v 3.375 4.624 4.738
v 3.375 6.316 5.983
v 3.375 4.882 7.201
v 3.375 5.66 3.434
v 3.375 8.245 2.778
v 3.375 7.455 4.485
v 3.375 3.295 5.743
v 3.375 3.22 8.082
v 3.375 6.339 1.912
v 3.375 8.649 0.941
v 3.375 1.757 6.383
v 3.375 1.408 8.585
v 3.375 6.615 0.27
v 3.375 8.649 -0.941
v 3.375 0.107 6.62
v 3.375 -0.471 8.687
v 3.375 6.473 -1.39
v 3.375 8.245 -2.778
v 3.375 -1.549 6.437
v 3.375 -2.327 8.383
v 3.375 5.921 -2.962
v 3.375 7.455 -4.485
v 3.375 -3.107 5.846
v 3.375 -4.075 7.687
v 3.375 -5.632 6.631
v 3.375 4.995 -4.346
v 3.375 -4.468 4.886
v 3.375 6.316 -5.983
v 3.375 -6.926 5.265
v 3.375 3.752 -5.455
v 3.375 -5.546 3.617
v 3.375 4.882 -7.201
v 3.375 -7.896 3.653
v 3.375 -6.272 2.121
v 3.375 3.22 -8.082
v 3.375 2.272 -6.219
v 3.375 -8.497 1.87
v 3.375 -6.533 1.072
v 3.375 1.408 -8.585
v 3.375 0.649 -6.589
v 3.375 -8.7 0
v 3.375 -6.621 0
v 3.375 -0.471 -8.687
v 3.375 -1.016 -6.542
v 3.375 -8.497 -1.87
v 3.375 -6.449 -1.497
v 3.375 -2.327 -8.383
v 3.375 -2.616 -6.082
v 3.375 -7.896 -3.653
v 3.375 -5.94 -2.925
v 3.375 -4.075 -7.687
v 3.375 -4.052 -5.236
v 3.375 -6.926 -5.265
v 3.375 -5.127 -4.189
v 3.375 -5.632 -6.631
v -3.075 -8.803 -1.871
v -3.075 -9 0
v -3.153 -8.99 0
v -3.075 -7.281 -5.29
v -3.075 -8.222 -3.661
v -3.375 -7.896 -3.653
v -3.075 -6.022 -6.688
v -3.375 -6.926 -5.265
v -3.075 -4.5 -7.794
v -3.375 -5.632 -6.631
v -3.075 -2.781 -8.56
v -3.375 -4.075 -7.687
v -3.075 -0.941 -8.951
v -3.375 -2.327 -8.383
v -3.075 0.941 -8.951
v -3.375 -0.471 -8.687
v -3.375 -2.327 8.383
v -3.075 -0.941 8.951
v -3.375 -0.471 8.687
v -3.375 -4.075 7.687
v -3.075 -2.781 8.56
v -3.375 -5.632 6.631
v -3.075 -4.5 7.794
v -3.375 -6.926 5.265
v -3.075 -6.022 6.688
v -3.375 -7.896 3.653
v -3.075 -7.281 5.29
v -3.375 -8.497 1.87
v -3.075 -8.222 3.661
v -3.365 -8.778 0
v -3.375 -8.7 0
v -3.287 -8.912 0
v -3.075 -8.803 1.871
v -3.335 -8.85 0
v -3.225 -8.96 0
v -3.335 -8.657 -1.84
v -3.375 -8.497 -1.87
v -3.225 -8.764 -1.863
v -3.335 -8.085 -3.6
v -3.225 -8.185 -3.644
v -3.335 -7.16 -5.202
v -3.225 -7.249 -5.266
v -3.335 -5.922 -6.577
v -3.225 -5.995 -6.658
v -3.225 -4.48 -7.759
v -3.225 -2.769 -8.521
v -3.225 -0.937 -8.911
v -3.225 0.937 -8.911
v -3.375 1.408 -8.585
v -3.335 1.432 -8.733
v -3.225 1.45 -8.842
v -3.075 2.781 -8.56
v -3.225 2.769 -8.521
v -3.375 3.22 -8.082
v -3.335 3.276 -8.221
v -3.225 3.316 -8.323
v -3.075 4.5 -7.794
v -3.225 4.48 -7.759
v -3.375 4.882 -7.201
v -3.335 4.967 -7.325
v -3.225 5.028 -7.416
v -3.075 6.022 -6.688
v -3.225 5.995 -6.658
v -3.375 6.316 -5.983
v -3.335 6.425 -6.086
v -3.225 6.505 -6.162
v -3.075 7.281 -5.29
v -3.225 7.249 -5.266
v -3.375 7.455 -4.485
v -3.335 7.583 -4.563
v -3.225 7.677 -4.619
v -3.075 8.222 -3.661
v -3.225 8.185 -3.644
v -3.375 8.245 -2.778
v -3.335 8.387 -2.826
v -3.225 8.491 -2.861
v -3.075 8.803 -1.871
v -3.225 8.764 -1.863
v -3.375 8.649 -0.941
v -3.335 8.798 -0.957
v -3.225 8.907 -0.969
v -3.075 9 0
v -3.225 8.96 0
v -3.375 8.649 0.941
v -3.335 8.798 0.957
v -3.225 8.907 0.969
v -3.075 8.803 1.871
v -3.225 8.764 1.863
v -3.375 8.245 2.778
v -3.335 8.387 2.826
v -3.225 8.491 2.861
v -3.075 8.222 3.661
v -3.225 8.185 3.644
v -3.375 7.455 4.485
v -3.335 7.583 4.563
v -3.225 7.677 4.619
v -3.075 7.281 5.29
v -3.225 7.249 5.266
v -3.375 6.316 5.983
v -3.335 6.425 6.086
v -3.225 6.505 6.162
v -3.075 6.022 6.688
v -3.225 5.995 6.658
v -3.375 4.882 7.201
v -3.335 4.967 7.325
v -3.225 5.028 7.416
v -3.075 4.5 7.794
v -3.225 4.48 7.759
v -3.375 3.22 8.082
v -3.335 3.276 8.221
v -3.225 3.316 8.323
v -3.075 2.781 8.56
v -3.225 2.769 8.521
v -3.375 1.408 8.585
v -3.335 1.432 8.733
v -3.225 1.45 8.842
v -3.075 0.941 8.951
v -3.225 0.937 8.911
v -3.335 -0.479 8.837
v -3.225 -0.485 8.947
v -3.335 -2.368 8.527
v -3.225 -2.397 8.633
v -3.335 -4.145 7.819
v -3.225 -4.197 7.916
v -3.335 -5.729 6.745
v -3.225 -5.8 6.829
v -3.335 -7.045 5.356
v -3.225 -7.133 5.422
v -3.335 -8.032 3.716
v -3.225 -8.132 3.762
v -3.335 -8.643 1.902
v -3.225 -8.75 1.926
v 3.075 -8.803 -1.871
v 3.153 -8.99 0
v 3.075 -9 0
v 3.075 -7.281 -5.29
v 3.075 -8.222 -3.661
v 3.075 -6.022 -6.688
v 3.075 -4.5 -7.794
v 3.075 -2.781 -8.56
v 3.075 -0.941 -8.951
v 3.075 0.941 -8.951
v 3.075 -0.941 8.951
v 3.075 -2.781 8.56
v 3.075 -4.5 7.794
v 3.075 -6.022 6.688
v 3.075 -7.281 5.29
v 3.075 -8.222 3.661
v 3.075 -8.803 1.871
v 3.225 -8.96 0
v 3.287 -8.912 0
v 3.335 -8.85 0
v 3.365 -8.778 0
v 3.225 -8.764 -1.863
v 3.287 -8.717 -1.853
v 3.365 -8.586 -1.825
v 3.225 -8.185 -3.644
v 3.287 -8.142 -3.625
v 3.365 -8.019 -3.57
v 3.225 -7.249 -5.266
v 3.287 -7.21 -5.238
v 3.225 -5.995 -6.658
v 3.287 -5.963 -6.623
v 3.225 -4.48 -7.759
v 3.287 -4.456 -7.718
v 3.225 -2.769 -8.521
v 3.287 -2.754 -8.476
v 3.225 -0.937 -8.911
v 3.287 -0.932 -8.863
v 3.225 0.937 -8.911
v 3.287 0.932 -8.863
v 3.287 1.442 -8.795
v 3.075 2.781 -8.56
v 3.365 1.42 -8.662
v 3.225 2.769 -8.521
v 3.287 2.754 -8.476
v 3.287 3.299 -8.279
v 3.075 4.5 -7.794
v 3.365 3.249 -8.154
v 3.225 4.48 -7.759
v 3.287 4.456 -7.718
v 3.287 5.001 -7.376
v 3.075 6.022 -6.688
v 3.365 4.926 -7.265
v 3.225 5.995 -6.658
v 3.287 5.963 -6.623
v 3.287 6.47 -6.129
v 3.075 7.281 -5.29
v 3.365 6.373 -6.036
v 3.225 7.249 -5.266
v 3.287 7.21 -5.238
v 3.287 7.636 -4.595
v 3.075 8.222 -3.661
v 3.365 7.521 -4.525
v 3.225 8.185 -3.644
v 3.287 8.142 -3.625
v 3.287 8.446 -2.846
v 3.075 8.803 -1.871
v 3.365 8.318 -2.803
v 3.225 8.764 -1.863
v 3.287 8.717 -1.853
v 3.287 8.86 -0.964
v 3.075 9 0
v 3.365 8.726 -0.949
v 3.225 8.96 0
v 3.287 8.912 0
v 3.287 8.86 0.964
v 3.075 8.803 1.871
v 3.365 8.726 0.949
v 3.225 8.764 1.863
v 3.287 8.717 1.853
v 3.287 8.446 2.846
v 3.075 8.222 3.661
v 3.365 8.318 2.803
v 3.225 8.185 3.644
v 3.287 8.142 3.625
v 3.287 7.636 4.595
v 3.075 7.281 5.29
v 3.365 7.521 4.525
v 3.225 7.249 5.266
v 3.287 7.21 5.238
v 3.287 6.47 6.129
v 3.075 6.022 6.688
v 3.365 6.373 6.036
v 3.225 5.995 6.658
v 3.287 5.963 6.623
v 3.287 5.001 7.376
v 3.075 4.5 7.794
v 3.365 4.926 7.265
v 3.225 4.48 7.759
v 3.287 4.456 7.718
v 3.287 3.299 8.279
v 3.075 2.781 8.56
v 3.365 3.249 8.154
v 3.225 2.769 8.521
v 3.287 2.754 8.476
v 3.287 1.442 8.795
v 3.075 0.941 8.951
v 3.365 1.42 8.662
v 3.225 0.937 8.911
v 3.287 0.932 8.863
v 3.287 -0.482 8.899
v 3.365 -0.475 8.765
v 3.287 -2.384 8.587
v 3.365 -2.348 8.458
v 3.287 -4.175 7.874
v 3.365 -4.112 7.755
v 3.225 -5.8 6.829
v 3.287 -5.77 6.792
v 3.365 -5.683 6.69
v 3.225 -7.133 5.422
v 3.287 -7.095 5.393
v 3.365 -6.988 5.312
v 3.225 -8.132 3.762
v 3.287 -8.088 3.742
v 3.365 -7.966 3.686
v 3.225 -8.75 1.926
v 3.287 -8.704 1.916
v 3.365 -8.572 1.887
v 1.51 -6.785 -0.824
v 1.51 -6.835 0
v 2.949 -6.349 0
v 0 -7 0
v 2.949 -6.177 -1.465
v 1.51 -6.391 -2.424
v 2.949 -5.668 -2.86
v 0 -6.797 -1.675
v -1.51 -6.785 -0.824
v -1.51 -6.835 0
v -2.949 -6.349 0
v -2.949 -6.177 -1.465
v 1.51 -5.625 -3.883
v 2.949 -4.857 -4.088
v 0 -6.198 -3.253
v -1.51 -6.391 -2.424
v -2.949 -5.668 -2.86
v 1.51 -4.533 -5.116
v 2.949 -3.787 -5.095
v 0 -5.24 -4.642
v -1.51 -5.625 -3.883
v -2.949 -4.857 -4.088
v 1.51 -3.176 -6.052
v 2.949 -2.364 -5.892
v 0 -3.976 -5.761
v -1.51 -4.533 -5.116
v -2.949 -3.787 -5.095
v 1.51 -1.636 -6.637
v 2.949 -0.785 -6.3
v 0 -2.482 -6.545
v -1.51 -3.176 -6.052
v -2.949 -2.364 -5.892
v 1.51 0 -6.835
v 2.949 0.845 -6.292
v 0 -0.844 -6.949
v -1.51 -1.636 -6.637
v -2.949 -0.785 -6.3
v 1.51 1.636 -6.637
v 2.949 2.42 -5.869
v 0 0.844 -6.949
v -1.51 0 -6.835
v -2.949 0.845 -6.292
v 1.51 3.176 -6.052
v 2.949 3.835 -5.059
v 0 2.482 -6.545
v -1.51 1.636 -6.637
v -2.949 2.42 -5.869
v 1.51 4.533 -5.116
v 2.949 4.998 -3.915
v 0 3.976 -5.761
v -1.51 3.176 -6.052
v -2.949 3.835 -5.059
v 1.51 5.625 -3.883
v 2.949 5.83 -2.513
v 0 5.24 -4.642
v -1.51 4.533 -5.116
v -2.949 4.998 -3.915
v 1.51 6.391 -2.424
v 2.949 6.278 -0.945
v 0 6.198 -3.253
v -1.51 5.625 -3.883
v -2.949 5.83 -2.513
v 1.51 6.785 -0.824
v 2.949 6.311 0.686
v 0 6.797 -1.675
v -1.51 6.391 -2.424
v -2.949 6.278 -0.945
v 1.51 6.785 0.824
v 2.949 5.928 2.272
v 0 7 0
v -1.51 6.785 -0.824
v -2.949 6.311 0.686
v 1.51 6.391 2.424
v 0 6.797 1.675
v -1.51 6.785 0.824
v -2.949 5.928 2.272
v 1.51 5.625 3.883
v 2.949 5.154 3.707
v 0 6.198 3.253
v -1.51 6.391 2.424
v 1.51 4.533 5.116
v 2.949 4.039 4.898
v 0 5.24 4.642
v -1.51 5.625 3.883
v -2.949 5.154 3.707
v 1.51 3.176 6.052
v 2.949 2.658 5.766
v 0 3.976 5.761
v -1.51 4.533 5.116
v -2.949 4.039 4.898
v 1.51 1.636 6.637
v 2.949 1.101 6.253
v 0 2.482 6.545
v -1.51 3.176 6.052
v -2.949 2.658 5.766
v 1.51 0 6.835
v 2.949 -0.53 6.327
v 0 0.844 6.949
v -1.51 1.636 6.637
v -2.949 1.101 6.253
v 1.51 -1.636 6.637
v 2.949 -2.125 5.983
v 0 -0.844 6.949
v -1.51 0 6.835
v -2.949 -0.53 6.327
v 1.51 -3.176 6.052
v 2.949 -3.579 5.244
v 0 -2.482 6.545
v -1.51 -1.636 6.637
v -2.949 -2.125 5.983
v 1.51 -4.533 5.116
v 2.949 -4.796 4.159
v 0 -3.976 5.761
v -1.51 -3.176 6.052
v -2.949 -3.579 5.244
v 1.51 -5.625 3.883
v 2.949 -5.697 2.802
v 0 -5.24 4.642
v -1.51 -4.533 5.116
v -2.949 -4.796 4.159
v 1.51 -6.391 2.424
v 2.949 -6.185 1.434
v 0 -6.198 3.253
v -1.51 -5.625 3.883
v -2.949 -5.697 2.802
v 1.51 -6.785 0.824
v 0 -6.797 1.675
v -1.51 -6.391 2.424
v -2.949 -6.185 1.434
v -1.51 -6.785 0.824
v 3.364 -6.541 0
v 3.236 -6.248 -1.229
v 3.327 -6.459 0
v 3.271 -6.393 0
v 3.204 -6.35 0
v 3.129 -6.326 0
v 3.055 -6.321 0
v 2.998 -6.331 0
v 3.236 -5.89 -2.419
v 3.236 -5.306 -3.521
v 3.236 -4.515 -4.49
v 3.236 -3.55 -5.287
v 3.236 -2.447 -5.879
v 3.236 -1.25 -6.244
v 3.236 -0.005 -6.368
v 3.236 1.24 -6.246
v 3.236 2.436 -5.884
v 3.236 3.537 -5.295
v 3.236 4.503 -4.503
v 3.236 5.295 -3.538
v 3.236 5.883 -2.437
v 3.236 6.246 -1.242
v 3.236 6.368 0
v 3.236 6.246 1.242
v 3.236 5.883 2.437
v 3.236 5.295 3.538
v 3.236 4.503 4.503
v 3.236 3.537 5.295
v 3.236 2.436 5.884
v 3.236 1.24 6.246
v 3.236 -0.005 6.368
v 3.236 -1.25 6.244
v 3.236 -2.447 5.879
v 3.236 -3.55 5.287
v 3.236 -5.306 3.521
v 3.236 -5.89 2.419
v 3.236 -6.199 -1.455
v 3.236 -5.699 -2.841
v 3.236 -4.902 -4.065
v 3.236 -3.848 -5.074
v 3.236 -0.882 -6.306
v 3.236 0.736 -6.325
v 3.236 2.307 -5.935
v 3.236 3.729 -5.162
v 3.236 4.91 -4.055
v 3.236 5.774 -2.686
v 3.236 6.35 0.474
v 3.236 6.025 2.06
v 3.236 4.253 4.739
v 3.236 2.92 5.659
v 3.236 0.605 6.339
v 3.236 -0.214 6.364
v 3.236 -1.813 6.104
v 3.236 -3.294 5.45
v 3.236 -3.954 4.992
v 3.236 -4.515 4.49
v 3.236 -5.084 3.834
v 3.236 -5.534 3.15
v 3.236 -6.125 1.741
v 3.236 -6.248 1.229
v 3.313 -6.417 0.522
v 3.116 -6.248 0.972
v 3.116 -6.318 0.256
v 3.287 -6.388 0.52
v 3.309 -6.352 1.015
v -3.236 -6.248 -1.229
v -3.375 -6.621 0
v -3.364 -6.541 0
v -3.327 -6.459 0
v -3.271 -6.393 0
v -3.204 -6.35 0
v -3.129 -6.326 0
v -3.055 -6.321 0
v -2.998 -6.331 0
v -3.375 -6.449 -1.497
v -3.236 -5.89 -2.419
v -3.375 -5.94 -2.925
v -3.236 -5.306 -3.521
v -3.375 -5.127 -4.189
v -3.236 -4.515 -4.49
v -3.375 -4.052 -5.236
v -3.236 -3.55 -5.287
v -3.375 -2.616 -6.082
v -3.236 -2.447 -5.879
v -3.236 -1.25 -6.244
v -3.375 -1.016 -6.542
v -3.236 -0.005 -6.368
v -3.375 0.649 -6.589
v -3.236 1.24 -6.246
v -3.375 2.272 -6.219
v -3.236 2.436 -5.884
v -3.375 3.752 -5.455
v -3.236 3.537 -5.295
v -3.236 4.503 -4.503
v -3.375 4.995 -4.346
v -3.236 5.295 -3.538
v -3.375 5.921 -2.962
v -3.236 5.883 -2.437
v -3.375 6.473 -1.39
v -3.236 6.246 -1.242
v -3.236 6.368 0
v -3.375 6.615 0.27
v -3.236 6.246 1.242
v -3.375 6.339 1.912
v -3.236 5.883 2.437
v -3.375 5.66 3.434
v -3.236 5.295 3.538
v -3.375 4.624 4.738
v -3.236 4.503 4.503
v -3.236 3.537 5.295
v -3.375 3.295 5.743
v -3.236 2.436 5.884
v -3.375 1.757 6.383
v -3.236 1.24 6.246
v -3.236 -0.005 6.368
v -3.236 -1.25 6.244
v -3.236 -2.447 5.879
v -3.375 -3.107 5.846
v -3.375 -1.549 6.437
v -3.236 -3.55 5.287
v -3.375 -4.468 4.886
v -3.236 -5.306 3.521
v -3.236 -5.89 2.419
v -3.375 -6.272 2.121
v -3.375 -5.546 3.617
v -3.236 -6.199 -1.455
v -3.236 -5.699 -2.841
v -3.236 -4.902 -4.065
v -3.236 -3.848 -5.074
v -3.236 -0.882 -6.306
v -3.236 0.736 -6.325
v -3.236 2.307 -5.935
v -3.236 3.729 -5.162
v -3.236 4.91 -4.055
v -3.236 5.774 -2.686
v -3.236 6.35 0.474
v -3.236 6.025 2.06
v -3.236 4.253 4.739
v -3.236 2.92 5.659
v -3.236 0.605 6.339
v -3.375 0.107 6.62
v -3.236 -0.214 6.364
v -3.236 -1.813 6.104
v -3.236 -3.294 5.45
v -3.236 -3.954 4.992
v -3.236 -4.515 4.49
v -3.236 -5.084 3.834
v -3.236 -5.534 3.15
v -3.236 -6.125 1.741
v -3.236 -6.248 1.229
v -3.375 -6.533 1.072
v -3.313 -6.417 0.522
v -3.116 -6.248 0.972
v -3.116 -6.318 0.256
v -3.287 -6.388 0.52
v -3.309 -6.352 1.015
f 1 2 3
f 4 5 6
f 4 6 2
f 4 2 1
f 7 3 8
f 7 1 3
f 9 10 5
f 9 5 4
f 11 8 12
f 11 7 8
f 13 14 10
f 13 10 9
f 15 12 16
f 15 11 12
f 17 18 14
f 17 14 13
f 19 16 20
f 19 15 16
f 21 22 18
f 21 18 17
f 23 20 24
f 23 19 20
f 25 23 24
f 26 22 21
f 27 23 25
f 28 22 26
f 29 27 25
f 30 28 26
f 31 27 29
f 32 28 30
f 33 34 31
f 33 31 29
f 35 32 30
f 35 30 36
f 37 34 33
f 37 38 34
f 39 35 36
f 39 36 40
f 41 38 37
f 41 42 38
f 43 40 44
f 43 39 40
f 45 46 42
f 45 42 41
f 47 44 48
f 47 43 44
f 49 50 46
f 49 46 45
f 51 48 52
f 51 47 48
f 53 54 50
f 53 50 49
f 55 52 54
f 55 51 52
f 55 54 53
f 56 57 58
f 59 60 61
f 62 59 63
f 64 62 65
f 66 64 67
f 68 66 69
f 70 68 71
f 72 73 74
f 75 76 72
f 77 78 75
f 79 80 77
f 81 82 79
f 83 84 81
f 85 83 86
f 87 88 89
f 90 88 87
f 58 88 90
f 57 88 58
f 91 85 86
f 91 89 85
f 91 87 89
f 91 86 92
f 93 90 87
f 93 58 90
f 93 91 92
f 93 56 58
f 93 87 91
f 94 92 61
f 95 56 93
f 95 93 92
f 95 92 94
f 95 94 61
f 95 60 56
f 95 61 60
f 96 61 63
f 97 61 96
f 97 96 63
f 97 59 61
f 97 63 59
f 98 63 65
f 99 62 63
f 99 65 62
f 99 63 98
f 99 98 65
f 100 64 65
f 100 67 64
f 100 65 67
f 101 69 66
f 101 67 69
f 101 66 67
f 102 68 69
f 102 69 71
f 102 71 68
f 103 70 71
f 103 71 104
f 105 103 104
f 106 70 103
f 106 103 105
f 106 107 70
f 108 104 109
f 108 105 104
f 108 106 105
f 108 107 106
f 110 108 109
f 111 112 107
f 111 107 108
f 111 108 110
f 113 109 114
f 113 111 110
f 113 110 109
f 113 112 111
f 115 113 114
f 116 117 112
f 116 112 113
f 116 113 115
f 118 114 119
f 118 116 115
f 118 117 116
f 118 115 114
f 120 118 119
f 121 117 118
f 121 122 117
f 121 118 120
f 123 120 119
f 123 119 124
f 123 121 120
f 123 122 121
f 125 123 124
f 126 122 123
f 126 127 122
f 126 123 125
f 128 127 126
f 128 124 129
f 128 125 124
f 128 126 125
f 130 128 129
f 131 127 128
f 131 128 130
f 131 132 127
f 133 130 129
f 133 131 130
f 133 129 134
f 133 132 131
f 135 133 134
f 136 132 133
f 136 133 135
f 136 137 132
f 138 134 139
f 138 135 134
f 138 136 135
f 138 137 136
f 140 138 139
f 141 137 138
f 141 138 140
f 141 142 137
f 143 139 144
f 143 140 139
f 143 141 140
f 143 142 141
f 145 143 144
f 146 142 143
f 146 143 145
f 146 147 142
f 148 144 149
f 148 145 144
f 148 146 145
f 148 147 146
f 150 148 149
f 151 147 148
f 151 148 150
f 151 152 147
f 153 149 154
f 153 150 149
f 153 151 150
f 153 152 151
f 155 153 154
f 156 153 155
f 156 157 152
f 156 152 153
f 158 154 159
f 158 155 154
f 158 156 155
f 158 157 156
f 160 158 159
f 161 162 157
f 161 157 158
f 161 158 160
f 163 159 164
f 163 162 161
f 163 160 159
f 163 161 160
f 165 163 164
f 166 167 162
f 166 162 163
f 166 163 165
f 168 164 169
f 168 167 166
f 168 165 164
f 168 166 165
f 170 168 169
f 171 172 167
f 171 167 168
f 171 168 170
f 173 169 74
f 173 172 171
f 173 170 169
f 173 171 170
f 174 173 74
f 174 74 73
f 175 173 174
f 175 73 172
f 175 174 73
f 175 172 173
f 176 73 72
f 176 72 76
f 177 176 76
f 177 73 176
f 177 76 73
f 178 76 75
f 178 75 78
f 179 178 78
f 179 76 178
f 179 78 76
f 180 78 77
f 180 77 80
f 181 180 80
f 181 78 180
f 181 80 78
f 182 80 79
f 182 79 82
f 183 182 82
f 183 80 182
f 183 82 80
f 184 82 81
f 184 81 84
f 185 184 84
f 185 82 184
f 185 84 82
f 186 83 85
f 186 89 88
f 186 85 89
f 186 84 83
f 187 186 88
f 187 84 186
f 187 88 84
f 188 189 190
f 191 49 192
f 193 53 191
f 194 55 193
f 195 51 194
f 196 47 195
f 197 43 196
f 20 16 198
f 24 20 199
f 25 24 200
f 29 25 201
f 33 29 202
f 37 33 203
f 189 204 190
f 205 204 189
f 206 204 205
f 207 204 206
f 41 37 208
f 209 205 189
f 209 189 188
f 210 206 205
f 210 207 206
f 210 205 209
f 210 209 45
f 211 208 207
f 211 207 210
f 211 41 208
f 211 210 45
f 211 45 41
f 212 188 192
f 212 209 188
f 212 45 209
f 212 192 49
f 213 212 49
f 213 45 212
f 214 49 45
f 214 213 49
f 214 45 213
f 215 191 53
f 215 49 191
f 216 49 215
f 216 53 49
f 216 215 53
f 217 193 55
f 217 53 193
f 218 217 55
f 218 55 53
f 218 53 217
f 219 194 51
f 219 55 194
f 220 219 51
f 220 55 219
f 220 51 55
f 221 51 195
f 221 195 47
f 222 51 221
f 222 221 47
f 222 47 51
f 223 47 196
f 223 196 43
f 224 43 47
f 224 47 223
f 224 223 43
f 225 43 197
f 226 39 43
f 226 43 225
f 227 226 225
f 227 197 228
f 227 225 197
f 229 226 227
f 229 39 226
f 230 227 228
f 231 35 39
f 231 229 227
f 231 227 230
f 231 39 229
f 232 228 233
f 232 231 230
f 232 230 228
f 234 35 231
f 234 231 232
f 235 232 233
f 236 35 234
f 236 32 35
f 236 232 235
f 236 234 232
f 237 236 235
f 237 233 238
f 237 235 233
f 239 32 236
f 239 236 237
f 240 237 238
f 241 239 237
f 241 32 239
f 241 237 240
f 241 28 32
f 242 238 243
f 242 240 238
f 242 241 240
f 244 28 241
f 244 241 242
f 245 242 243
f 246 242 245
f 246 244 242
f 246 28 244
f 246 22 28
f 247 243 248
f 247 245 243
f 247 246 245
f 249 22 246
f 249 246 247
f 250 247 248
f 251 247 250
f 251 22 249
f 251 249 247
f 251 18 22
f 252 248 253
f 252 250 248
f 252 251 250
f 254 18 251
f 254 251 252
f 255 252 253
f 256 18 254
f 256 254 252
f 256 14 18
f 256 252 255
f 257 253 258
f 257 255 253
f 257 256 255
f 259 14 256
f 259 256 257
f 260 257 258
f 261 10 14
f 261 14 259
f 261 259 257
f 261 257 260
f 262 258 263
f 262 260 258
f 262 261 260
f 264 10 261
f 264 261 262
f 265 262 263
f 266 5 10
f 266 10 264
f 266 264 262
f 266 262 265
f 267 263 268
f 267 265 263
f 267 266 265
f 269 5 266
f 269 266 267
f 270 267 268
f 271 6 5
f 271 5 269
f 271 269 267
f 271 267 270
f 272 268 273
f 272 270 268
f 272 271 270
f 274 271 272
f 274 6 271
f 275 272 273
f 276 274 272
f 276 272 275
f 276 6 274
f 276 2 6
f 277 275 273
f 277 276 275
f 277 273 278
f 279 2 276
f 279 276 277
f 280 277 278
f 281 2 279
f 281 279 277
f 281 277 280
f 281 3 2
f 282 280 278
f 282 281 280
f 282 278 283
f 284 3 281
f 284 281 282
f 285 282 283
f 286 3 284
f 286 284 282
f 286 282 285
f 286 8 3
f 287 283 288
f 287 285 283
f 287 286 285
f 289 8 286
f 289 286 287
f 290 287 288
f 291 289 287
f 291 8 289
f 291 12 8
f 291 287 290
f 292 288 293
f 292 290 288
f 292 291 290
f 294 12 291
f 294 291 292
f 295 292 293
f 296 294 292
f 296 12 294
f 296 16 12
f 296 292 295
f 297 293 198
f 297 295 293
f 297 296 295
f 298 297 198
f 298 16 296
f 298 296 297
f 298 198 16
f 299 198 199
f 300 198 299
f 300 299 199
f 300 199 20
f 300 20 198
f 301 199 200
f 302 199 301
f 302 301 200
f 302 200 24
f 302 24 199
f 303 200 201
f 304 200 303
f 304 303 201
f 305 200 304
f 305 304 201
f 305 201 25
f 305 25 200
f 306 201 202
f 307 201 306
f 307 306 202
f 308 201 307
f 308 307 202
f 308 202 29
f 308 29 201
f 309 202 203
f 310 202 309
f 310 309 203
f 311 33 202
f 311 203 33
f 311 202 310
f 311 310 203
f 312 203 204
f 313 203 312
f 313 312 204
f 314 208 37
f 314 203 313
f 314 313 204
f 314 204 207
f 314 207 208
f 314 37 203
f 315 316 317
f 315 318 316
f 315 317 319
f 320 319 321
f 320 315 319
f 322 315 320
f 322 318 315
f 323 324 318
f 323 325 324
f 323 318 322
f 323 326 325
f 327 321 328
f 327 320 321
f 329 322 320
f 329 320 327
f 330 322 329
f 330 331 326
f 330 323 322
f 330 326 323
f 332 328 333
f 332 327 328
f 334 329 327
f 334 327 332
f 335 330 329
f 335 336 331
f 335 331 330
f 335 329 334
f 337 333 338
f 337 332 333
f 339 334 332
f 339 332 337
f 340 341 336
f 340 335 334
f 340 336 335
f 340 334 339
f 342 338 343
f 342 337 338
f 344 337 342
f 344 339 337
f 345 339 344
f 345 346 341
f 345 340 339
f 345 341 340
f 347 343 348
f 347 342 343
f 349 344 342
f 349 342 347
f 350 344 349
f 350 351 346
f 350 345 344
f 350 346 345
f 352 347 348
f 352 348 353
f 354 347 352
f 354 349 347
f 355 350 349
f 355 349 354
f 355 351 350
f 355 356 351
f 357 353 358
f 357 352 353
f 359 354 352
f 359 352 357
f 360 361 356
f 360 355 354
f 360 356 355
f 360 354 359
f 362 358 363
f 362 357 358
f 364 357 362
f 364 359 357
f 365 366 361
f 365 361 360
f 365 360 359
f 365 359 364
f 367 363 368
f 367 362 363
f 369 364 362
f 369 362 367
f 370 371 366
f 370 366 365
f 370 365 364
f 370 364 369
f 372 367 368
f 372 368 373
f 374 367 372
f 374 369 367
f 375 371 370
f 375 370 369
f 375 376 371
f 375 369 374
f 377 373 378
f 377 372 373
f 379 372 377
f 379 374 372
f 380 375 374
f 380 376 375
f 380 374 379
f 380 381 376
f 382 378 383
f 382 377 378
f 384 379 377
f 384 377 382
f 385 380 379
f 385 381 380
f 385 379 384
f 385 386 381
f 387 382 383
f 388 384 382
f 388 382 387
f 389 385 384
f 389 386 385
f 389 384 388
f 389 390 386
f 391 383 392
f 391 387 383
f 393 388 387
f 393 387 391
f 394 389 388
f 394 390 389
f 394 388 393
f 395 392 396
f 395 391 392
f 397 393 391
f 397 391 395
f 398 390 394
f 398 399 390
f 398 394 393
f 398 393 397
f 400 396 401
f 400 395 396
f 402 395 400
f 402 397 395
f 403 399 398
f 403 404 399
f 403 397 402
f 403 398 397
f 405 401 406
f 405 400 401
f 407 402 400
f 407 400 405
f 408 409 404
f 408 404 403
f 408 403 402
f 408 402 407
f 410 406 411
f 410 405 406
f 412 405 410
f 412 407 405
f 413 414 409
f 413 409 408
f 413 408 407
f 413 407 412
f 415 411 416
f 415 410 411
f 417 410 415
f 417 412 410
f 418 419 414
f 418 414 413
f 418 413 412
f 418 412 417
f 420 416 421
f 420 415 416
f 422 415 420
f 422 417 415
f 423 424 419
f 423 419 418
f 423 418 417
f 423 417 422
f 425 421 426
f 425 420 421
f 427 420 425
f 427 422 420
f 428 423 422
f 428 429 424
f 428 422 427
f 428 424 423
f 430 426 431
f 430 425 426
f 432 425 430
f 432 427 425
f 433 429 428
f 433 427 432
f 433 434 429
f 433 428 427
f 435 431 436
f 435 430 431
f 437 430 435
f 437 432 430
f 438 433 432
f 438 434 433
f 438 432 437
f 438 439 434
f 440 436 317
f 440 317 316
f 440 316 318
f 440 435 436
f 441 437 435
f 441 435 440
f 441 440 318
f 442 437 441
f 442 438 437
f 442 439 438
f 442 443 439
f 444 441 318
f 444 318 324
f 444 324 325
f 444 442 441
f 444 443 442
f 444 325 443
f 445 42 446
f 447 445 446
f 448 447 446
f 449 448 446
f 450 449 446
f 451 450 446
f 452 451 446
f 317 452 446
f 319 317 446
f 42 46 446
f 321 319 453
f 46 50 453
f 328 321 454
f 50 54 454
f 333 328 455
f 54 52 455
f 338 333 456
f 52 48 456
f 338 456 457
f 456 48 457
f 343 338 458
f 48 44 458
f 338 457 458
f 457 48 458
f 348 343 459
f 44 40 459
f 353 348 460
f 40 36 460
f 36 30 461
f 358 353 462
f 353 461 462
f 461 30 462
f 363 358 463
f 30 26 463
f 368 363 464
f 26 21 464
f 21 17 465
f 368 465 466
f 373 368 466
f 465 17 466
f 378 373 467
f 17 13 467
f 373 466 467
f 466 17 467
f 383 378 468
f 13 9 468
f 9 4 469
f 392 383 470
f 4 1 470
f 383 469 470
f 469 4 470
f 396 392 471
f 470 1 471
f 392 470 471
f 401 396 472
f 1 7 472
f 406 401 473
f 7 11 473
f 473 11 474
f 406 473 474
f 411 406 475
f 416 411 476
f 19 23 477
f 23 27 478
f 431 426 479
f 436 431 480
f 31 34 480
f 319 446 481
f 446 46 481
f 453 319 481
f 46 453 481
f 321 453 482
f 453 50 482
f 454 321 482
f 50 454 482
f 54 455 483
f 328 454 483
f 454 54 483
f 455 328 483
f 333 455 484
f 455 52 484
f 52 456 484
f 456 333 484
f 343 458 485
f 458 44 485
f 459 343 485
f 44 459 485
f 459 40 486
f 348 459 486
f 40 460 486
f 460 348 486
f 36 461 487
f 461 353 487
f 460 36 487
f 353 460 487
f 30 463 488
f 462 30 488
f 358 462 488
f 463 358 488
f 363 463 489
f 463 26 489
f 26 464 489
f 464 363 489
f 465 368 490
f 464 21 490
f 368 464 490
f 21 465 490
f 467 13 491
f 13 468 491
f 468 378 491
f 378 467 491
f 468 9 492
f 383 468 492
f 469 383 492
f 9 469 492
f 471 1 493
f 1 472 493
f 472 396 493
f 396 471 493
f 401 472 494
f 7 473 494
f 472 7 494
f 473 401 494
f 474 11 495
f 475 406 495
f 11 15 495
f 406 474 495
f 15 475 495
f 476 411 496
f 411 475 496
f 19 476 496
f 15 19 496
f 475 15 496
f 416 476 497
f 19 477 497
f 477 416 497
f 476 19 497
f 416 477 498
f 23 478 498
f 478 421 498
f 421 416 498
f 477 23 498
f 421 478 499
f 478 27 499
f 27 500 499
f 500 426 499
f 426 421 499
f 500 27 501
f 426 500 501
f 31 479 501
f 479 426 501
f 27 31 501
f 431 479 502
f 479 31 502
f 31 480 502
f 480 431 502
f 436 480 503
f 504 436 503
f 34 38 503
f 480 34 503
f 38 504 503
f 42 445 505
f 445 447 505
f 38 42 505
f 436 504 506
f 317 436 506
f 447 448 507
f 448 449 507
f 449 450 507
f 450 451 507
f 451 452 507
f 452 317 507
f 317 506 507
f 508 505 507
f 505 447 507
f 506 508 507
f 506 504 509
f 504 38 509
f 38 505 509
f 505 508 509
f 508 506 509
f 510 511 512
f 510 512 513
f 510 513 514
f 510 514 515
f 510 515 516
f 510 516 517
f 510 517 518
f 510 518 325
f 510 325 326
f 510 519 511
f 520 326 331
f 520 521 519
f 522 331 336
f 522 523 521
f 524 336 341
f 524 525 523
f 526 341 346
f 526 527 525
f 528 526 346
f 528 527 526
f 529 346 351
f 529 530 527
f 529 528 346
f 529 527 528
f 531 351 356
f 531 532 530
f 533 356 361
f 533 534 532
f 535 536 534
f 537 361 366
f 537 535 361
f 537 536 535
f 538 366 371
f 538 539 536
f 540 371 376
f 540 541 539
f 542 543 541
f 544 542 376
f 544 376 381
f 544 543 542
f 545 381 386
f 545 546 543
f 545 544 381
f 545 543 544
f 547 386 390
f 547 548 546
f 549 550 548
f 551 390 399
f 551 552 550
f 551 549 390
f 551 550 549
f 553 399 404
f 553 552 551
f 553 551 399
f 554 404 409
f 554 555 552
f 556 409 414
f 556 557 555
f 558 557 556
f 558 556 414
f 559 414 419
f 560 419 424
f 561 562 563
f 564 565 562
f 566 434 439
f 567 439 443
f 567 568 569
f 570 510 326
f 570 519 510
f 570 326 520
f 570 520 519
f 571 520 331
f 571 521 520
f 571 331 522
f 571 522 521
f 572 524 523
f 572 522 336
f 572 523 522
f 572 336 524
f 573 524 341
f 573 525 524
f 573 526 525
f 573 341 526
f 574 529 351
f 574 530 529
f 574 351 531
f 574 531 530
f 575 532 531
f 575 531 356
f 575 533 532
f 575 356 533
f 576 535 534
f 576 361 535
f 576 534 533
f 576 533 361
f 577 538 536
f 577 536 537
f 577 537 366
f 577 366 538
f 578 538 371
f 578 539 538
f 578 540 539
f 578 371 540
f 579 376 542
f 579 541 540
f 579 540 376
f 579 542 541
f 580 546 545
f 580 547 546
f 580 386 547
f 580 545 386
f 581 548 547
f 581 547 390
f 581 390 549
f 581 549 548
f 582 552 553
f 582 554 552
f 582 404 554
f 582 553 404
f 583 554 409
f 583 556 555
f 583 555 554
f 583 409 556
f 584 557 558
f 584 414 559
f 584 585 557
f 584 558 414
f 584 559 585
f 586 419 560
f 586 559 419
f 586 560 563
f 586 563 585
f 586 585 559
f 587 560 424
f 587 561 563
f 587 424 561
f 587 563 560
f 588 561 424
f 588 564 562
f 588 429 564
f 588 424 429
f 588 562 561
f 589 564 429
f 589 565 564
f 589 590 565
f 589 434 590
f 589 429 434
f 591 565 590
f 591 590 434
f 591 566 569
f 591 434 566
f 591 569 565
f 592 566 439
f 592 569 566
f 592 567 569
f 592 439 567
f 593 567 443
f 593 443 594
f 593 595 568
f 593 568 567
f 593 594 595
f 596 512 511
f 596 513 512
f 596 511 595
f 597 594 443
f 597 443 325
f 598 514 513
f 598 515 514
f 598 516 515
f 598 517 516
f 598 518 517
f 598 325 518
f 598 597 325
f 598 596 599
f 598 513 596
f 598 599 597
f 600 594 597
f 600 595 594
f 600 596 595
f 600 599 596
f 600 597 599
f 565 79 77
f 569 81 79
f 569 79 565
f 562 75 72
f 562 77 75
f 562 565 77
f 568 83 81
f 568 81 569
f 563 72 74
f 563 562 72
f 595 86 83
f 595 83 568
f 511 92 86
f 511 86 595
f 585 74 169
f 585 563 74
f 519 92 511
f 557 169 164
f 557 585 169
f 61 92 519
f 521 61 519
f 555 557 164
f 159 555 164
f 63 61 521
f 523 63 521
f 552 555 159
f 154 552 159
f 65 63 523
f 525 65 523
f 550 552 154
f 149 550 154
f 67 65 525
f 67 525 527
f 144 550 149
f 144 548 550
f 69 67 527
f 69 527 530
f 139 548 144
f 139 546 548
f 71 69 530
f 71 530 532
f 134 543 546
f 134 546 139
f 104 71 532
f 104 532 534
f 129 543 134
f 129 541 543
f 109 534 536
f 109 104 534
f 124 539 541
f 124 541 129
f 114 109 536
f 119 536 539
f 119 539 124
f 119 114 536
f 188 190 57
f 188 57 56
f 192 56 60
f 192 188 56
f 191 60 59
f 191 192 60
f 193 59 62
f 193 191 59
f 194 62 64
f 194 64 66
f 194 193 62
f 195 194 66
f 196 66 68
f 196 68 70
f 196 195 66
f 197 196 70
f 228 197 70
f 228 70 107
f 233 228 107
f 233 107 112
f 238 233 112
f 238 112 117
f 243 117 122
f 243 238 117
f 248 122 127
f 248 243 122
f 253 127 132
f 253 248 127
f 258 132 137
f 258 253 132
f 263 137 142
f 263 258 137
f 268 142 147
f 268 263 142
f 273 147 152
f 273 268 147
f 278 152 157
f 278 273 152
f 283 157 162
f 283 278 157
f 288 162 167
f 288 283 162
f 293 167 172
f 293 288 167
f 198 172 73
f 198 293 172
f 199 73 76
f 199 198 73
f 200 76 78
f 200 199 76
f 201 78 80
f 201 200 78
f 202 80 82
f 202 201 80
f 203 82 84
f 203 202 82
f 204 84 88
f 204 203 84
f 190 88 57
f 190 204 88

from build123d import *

# Parameters (mm, degrees)
FILLET_1_R = 0.3


with BuildPart() as part:
    # 草图1 → 旋转1 (revolve)
    with BuildSketch(Plane.XY, mode=Mode.PRIVATE) as revolve_1_sk:
        with BuildLine():
            Line((-3.375, 6.132648286), (-3.375, 9))
            Line((-3.375, 9), (3.375, 9))
            Line((3.375, 9), (3.375, 6.132648286))
            ThreePointArc((3.375, 6.132648286), (0, 7), (-3.375, 6.132648286))
        make_face()
    revolve(revolve_1_sk.sketch.rotate(Axis((-8.353570551, 0, 0), (1, 0, 0)), 180), axis=Axis((-8.353570551, 0, 0), (1, 0, 0)))

    # 圆角1
    fillet_1_edges = [part.edges().sort_by_distance(p)[0] for p in [
        (3.375, 6.132648286, 0),
        (-3.375, 6.132648286, 0),
        (-3.375, 9, 0),
        (3.375, 9, 0),
    ]]
    fillet(fillet_1_edges, radius=FILLET_1_R)


solid = part.part
